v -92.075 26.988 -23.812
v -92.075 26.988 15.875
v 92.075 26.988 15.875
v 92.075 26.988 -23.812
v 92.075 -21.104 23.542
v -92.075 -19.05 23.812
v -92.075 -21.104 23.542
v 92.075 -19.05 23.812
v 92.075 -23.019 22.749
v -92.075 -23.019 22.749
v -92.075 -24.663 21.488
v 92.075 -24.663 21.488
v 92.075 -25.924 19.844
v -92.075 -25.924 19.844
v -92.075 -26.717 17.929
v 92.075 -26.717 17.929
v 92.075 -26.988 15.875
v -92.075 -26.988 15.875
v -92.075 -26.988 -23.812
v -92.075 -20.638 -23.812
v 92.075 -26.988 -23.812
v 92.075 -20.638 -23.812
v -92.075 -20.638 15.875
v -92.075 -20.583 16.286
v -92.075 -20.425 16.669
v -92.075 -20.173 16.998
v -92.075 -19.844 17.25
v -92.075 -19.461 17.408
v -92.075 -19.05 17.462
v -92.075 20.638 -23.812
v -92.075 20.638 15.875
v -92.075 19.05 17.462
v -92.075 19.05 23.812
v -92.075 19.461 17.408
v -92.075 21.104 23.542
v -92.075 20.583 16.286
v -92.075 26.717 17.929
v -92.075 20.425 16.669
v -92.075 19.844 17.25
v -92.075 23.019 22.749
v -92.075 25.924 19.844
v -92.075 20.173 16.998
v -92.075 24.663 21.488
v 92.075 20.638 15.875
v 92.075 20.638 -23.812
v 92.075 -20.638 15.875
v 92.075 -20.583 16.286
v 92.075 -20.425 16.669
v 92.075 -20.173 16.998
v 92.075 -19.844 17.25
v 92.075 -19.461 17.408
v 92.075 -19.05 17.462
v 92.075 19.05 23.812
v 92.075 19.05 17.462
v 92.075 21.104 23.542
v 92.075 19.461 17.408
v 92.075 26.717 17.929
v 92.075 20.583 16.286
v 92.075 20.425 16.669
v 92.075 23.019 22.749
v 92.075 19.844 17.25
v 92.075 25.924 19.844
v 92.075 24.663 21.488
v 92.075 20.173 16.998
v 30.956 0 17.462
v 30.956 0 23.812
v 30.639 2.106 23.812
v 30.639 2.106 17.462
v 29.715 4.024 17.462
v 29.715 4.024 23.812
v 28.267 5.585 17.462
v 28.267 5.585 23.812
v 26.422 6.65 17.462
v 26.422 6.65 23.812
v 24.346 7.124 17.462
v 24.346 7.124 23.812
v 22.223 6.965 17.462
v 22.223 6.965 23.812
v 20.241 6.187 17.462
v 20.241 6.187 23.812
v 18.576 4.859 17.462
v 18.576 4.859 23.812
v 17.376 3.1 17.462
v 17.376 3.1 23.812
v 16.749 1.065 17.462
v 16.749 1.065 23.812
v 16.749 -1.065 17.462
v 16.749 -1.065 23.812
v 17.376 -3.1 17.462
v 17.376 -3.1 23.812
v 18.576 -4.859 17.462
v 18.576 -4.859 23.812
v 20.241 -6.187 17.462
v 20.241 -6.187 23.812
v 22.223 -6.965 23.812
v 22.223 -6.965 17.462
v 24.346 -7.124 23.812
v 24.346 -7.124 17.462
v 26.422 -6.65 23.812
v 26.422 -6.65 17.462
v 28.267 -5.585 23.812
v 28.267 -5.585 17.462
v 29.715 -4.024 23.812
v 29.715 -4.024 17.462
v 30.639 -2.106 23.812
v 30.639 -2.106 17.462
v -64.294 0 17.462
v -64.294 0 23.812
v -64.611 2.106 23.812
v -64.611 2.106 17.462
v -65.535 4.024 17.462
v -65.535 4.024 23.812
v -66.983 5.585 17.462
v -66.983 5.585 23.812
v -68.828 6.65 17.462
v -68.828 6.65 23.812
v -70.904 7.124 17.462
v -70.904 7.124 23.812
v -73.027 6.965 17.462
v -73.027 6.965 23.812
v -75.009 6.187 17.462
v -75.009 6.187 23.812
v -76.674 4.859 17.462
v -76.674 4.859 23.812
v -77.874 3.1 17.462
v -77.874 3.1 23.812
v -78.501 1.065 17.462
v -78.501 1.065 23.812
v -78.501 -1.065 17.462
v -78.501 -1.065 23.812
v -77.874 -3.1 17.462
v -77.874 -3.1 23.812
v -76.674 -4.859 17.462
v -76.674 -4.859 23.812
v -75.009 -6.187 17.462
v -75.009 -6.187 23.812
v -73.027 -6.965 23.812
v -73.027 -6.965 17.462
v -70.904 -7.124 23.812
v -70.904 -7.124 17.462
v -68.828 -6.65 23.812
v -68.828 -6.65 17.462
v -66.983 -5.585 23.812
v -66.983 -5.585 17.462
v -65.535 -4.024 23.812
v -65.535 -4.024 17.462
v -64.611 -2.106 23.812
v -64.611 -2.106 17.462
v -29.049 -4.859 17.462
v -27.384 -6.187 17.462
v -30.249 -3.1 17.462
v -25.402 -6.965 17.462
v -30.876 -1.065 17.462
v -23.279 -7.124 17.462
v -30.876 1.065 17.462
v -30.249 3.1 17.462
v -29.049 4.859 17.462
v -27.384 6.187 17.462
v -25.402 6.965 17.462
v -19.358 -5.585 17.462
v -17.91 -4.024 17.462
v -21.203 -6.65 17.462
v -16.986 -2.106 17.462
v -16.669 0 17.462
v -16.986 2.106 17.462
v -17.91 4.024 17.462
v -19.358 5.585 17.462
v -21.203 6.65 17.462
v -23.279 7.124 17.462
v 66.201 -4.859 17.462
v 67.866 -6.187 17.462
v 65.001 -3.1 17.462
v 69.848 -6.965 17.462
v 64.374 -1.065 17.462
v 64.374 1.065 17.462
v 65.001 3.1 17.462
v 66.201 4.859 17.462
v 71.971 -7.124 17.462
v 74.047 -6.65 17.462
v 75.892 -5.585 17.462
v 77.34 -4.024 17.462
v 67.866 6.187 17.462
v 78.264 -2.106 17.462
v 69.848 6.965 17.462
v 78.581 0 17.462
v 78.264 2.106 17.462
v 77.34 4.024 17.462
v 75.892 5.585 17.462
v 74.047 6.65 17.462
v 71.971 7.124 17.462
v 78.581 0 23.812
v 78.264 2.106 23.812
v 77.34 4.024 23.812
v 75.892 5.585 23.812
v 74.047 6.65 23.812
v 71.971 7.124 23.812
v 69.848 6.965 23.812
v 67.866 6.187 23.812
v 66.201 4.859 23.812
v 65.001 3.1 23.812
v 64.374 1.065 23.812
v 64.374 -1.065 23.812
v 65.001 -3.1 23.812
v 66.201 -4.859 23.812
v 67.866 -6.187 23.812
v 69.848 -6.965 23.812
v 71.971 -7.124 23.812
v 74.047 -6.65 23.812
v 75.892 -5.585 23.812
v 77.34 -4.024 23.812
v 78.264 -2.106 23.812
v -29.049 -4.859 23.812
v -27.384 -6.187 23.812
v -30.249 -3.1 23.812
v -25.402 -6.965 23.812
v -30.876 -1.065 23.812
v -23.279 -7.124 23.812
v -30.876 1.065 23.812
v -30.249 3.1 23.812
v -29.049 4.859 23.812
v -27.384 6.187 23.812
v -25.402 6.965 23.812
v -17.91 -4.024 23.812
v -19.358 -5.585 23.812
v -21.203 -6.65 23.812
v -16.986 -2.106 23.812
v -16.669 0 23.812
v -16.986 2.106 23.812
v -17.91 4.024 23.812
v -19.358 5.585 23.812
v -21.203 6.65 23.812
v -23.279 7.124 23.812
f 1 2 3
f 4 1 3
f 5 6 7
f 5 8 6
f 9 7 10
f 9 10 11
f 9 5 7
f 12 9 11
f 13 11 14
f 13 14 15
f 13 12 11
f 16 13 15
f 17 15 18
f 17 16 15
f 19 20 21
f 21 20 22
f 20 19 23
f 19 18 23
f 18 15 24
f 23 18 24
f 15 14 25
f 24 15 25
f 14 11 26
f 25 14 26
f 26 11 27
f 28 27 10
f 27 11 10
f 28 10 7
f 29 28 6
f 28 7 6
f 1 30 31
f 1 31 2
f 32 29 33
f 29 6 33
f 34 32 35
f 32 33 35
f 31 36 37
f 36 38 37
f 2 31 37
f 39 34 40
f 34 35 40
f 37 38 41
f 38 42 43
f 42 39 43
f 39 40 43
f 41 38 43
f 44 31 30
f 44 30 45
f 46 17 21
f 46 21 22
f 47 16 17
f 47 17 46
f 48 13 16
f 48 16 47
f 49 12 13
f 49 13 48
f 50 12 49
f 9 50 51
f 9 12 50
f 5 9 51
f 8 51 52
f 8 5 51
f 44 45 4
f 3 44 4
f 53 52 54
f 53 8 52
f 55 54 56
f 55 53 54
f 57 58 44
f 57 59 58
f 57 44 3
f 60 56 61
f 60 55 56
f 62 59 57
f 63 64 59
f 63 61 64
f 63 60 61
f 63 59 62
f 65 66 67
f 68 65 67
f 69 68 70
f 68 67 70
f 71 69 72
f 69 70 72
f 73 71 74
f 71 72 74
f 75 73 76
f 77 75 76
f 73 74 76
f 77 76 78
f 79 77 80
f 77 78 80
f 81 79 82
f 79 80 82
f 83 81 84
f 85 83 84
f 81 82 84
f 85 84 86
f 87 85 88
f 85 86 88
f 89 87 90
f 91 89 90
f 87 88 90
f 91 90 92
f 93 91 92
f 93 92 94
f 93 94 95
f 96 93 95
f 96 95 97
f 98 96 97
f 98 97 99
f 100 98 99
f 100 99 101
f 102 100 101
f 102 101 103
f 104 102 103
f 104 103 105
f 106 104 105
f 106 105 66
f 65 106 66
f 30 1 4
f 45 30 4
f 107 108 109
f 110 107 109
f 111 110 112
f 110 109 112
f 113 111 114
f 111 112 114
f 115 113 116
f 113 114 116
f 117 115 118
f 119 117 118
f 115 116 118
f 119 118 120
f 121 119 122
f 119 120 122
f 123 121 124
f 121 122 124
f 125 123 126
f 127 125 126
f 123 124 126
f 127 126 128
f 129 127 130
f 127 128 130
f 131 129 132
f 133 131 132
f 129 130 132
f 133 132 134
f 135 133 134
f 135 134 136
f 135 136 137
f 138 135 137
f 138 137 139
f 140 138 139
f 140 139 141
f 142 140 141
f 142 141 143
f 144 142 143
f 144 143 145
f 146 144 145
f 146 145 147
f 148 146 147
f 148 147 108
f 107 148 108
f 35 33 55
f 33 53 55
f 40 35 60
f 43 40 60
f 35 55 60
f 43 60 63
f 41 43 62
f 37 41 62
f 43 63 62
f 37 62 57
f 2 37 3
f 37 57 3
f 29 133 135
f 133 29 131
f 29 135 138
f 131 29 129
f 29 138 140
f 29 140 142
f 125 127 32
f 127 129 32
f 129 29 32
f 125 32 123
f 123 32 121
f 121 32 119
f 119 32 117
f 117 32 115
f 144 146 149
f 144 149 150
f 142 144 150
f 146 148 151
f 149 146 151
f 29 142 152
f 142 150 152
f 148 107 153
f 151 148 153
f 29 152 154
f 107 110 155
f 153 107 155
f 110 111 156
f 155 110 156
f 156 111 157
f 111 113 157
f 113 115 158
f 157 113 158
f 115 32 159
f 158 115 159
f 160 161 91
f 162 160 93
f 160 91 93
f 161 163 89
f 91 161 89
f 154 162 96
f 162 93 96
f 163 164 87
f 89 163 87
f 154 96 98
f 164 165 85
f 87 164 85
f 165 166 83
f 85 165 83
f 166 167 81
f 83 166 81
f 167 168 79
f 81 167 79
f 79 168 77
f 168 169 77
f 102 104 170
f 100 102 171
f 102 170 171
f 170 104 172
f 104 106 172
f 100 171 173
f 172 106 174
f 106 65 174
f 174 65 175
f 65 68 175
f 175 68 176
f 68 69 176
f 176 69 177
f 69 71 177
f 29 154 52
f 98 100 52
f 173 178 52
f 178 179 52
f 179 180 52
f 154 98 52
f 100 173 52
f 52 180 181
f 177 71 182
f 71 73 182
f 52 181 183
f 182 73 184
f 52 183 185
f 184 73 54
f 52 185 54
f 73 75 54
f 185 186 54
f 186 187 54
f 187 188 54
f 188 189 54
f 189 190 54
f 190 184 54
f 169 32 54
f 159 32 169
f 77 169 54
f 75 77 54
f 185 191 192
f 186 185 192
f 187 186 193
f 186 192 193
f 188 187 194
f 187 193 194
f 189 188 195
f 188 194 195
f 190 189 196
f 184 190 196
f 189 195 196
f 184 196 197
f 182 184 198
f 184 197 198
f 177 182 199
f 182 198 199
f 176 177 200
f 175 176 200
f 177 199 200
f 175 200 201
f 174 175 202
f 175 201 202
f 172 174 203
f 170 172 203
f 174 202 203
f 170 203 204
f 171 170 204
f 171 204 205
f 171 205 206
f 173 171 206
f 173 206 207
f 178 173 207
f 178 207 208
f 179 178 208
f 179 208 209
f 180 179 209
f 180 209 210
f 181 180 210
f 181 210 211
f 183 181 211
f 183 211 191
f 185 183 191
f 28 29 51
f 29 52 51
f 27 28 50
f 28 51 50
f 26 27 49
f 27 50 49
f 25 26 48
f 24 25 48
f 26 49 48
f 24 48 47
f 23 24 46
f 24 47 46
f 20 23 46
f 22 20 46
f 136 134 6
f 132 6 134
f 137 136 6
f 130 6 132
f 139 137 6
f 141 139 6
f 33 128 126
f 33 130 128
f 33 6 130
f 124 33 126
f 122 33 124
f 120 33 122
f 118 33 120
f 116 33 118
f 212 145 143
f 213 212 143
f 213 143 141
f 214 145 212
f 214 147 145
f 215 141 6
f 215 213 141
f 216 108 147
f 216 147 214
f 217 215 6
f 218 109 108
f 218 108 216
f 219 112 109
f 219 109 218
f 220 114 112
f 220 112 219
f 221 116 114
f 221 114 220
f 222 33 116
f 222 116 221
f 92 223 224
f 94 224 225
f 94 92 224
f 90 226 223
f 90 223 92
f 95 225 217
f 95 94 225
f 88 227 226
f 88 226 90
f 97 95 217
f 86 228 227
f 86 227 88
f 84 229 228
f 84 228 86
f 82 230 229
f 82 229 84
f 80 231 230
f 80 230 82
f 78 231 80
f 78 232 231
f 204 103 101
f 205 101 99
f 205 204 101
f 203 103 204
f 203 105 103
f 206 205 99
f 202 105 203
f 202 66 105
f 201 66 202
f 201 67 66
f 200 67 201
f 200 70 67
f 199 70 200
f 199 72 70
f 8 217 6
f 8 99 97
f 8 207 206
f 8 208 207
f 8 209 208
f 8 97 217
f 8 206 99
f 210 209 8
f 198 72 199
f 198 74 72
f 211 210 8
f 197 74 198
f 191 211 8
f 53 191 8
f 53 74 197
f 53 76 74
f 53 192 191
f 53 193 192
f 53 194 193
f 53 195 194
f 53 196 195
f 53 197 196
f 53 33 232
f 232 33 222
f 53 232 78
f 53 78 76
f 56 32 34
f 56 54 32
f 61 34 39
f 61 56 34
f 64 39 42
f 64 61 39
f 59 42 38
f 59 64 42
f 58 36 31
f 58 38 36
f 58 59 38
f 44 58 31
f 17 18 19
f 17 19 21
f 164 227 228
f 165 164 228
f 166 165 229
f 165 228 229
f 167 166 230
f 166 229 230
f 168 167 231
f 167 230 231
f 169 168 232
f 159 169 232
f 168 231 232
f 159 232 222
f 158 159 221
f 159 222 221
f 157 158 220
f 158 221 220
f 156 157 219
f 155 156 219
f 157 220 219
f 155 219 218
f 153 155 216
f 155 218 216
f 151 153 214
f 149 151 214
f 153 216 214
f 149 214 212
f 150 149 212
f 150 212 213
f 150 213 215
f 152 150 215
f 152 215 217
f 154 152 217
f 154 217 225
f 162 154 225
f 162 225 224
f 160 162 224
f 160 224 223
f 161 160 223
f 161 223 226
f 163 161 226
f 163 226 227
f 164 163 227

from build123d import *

# Parameters (mm, degrees)
SKETCH1_W           = 184.15
SKETCH1_H           = 53.975
BOSS_EXTRUDE1_DEPTH = 23.8125
FILLET1_R           = 7.9375
SHELL1_T            = -6.35
SKETCH2_R           = 7.14375
CUT_EXTRUDE1_DEPTH  = 47.625


with BuildPart() as part:
    # Sketch1 → Boss-Extrude1 (new, symmetric)
    with BuildSketch(Plane.XY):
        Rectangle(SKETCH1_W, SKETCH1_H)
    extrude(amount=BOSS_EXTRUDE1_DEPTH, both=True)

    # Fillet1
    fillet1_edges = [part.edges().sort_by_distance(p)[0] for p in [
        (0, 26.9875, 23.8125),
        (0, -26.9875, 23.8125),
    ]]
    fillet(fillet1_edges, radius=FILLET1_R)

    # Shell1
    shell1_openings = [part.faces().sort_by_distance(p)[0] for p in [
        (0, 0, -23.8125),
        (92.075, 0, -0.234313972),
        (-92.075, 0, -0.234313972),
    ]]
    offset(amount=SHELL1_T, openings=shell1_openings, kind=Kind.INTERSECTION)

    # Sketch2 → Cut-Extrude1 (cut)
    with BuildSketch(Plane.XY.offset(23.8125)):
        with Locations((-71.4375, 0)):
            Circle(SKETCH2_R)
        with Locations((-23.8125, 0)):
            Circle(SKETCH2_R)
        with Locations((23.8125, 0)):
            Circle(SKETCH2_R)
        with Locations((71.4375, 0)):
            Circle(SKETCH2_R)
    extrude(amount=-CUT_EXTRUDE1_DEPTH, mode=Mode.SUBTRACT)


solid = part.part
